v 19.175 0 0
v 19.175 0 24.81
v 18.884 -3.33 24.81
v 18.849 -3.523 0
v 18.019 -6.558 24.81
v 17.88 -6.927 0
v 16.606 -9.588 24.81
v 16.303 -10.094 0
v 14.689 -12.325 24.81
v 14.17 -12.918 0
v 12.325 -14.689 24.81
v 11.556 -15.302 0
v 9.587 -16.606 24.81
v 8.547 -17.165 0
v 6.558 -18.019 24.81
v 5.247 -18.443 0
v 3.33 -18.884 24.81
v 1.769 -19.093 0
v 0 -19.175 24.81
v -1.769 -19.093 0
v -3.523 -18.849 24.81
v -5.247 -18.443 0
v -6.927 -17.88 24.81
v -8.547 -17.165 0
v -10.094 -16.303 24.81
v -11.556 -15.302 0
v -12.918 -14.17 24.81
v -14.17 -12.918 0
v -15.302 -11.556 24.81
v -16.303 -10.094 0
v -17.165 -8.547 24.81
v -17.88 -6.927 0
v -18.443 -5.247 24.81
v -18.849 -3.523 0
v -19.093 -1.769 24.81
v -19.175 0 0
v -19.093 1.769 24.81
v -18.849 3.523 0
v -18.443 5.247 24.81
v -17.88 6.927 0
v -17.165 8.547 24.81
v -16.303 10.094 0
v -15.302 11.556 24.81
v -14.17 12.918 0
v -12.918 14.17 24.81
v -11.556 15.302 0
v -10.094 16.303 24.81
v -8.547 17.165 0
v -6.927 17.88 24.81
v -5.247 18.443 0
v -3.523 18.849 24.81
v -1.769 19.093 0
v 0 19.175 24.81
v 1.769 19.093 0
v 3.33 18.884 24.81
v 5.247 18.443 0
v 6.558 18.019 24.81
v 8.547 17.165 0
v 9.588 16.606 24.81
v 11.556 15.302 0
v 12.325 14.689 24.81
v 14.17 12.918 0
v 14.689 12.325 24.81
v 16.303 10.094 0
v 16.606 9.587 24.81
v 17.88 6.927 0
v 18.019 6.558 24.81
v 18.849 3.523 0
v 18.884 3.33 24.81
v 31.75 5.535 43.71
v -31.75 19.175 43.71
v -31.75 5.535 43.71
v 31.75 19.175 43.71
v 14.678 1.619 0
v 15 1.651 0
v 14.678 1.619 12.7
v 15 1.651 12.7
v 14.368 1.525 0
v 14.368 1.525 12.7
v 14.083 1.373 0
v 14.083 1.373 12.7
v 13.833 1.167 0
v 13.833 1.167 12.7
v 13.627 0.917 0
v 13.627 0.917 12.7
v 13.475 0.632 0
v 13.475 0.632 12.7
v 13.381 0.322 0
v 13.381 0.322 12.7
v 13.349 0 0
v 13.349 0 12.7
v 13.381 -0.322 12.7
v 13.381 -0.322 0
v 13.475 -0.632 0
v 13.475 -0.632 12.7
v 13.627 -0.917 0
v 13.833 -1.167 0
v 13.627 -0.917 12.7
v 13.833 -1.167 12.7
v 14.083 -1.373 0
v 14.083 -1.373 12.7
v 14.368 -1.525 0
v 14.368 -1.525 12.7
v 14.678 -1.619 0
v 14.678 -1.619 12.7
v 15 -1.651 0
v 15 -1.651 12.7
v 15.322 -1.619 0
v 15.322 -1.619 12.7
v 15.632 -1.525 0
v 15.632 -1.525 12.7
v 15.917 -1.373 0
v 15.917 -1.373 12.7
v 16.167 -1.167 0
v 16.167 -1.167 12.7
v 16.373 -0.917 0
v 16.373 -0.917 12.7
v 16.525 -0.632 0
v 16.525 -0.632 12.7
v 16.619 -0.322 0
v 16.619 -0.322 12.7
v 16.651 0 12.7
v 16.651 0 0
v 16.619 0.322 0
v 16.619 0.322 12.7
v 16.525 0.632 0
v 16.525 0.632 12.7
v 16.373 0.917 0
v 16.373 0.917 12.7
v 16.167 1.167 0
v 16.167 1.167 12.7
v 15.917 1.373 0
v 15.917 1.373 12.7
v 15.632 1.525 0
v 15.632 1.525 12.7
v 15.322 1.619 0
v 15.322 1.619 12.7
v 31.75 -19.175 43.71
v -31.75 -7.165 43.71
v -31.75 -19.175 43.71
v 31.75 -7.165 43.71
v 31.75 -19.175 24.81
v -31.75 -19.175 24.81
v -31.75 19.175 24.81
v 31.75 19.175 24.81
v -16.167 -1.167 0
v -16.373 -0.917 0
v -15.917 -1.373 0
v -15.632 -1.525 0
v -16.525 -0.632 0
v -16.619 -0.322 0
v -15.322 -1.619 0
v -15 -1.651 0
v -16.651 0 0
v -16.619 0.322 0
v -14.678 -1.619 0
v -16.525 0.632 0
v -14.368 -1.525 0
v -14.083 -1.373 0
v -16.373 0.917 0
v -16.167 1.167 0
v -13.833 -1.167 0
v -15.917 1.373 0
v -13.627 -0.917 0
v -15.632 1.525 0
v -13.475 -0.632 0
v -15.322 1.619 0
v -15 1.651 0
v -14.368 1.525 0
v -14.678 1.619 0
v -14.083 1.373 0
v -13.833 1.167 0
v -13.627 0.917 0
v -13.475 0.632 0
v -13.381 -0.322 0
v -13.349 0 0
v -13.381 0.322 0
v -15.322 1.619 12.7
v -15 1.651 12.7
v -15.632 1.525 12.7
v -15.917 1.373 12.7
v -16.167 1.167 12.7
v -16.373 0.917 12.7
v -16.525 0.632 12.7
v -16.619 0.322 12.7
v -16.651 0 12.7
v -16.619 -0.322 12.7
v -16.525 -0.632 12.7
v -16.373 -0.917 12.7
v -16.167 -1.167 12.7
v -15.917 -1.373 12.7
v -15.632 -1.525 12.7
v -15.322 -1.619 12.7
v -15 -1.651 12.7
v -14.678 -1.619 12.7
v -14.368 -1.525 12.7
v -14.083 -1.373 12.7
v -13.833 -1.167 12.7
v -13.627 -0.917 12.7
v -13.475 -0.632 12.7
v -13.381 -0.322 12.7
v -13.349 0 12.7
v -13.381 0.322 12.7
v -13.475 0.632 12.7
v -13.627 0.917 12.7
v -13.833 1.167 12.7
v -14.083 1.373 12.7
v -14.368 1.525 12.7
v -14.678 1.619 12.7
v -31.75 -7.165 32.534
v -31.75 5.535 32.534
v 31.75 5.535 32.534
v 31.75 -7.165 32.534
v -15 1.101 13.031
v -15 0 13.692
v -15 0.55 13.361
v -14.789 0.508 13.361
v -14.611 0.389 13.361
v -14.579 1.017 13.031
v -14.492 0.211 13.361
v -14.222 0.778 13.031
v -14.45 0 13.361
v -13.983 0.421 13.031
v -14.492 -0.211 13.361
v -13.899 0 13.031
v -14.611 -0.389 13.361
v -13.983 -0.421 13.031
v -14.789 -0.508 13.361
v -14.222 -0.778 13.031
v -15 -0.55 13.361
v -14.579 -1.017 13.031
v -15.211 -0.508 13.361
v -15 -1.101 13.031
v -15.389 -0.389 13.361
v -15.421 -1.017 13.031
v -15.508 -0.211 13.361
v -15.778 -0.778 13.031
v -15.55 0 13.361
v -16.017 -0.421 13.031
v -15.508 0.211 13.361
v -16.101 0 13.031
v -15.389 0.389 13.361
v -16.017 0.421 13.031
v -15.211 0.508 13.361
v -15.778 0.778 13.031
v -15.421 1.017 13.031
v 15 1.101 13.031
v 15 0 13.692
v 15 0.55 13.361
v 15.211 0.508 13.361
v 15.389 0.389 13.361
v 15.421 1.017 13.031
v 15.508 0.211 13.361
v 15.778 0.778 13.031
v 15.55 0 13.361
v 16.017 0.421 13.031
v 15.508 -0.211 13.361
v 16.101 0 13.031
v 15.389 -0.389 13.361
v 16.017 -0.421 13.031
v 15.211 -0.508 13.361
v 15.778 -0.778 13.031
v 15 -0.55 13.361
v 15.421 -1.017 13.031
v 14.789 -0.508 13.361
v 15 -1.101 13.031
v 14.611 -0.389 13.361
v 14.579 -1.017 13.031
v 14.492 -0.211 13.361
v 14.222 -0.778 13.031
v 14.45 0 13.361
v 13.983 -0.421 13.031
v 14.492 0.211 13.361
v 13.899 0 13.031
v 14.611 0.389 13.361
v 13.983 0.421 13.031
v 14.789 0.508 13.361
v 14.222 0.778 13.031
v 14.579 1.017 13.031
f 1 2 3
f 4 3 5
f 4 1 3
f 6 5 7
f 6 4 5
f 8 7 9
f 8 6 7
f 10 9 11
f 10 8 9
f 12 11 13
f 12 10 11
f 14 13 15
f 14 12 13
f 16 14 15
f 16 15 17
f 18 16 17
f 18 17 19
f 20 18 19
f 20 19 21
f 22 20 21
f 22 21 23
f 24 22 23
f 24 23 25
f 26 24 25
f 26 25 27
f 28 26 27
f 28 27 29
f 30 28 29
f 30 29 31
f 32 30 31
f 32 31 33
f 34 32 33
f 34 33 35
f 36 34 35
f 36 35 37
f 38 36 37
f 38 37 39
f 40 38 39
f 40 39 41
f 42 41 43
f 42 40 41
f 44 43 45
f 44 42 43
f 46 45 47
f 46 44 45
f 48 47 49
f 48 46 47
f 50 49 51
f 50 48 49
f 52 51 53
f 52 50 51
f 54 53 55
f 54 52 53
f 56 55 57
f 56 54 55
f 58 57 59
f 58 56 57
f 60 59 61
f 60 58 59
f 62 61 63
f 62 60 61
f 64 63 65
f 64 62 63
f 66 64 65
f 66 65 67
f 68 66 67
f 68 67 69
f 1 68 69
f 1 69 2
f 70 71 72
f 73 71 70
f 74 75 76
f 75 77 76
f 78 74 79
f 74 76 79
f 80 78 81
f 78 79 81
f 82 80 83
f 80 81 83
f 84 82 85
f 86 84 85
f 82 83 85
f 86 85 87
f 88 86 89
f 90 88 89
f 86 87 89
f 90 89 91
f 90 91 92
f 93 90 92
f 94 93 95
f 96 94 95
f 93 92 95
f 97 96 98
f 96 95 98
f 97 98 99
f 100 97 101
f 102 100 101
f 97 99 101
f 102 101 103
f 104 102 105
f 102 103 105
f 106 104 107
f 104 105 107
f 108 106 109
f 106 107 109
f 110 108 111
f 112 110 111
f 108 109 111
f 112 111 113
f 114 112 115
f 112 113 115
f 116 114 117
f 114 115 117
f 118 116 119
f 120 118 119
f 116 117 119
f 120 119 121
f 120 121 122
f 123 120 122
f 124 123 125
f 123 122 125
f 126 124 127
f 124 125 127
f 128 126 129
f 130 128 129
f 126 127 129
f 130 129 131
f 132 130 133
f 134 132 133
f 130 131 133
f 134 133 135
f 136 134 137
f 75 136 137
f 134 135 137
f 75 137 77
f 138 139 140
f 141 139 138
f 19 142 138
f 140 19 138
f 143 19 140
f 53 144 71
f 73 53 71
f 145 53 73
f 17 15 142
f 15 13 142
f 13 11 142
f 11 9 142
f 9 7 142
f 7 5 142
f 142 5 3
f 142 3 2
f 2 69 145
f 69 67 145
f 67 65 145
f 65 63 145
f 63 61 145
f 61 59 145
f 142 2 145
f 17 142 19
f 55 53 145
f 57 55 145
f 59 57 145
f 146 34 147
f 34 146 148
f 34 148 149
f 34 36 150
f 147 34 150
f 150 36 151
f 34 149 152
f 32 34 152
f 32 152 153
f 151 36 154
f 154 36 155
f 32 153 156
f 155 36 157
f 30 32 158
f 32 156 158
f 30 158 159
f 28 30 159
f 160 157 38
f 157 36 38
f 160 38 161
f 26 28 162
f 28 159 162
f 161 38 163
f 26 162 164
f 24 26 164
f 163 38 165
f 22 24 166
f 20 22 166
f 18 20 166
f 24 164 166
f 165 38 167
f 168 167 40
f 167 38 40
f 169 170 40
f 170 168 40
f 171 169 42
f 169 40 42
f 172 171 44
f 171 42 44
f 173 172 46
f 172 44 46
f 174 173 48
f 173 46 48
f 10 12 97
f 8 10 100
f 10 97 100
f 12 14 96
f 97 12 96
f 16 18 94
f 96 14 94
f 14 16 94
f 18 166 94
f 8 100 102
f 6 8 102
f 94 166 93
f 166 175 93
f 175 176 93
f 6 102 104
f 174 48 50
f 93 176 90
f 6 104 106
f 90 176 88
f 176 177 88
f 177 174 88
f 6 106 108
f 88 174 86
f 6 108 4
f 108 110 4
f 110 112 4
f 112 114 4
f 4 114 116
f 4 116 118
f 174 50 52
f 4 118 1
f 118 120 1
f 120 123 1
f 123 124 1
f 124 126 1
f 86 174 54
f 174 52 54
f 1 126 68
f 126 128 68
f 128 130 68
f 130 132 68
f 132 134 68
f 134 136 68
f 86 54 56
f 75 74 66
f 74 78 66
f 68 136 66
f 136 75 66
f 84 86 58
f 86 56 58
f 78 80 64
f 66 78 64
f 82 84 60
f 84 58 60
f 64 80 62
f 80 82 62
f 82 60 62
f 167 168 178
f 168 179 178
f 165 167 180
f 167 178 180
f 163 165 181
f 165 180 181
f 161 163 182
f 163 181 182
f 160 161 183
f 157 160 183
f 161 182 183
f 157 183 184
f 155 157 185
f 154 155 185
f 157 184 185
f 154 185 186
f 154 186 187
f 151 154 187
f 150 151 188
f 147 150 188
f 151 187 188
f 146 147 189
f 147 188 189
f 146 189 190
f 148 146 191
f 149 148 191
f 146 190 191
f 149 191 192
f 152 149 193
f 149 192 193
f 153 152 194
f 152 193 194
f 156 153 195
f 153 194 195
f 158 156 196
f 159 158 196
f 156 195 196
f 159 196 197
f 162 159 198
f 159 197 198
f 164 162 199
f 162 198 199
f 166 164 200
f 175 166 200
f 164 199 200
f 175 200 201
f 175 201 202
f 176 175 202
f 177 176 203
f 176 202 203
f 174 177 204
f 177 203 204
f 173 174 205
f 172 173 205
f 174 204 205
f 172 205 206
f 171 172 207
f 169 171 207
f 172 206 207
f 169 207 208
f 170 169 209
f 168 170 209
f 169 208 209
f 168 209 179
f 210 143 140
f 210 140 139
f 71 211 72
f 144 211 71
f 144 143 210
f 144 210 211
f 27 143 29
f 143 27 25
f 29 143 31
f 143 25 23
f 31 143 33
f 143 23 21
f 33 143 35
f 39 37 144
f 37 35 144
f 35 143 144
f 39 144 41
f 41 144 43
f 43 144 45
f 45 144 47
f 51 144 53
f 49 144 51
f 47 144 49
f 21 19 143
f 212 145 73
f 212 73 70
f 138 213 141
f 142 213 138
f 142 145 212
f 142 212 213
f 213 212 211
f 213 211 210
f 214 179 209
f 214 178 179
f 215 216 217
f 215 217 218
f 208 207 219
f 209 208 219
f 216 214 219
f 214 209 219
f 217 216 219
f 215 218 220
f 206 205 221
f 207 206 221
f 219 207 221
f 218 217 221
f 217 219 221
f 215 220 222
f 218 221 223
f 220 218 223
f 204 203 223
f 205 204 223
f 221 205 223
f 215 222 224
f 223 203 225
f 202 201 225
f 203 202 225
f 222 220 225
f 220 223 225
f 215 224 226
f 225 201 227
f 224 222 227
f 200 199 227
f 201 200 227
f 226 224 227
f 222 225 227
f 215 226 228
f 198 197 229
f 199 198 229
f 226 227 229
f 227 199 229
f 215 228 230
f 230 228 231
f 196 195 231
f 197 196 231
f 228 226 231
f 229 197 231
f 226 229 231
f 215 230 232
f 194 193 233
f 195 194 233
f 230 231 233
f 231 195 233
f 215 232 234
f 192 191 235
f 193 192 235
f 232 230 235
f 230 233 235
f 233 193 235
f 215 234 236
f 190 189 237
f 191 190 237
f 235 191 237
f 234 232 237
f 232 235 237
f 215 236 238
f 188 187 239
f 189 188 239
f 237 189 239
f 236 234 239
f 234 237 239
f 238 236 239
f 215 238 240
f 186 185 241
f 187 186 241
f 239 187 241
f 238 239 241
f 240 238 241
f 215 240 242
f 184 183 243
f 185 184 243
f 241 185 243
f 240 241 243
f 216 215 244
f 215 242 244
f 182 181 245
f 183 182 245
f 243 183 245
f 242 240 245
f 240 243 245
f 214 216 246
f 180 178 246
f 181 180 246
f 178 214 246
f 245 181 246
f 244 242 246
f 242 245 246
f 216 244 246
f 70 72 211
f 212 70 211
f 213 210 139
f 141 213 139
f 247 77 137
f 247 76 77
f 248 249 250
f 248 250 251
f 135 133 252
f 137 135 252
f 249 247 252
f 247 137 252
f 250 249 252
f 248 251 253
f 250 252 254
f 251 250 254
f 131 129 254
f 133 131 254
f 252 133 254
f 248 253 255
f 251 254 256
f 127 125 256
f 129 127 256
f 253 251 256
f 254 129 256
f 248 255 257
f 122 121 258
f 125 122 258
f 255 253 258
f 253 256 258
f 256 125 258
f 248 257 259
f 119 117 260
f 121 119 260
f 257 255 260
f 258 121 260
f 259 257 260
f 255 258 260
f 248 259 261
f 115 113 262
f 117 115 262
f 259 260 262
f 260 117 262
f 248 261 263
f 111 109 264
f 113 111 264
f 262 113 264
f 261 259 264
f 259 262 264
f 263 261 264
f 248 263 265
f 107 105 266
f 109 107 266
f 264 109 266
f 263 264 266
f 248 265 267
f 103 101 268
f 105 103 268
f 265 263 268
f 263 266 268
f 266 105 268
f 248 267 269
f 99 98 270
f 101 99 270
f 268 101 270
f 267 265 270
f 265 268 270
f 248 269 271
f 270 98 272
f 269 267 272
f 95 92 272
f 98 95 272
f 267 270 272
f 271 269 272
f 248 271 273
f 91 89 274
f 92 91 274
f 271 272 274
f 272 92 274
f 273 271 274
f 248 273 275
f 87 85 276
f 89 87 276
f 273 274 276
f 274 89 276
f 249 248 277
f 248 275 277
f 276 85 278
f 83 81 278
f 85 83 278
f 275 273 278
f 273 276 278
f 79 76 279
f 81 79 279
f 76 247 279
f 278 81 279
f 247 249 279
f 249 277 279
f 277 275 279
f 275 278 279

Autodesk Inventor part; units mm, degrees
ref_plane "YZ Plane" through (0, 0, 0) normal (1, 0, 0) x (0, 1, 0)
ref_plane "XZ Plane" through (0, 0, 0) normal (0, 1, 0) x (-1, 0, 0)
ref_plane "XY Plane" through (0, 0, 0) normal (0, 0, 1) x (1, 0, 0)
sketch "Sketch1" plane through (0, 0, 0) normal (0, 0, 1) x (1, 0, 0)
  circle A0 centre (0, 0) radius 19.175
  dimension "d0" = 38.35
extrude "Extrusion1" add sketch "Sketch1" along normal blind 24.81
sketch "Sketch2" plane through (0, 0, 24.81) normal (0, 0, 1) x (1, 0, 0)
  circle A0 centre (0, 0) radius 19.175 projected
  line L0 (-31.75, 19.175) -> (31.75, 19.175)
  line L1 (31.75, 19.175) -> (31.75, -19.175)
  line L2 (31.75, -19.175) -> (-31.75, -19.175)
  line L3 (-31.75, -19.175) -> (-31.75, 19.175)
  point P0 (0, -19.175)
  dimension "d3" = 63.5
extrude "Extrusion2" add sketch "Sketch2" along normal blind 18.9
sketch "Sketch3" plane through (0, 0, 0) normal (0, 0, -1) x (-1, 0, 0)
  circle A0 centre (0, 0) radius 19.175 projected
  line L0 (-15, 0) -> (15, 0)
  dimension "d6" = 30
hole "Hole1" at (15, 0, 0) at (-15, 0, 0) direction (0, 0, 1) diameter 3.302 depth 12.7 tip angle 118 thread size "8-32 UNC" class "2B" standard "ANSI Unified Screw Threads"
sketch "Sketch4" plane through (-31.75, -19.175, 24.81) normal (-1, 0, 0) x (0, 0, 1)
  line L0 (18.9, 0) -> (18.9, 38.35) projected
  line L1 (18.9, 24.7099) -> (7.724, 24.7099)
  line L2 (7.724, 24.7099) -> (7.724, 12.0099)
  line L3 (7.724, 12.0099) -> (18.9, 12.0099)
  line L4 (18.9, 12.0099) -> (18.9, 24.7099)
  point P0 (-24.81, 19.175)
  dimension "d14" = 12.7
  dimension "d15" = 11.176
extrude "Extrusion3" cut sketch "Sketch4" against normal through all
properties part number "gripper" material "Aluminum-6061"
